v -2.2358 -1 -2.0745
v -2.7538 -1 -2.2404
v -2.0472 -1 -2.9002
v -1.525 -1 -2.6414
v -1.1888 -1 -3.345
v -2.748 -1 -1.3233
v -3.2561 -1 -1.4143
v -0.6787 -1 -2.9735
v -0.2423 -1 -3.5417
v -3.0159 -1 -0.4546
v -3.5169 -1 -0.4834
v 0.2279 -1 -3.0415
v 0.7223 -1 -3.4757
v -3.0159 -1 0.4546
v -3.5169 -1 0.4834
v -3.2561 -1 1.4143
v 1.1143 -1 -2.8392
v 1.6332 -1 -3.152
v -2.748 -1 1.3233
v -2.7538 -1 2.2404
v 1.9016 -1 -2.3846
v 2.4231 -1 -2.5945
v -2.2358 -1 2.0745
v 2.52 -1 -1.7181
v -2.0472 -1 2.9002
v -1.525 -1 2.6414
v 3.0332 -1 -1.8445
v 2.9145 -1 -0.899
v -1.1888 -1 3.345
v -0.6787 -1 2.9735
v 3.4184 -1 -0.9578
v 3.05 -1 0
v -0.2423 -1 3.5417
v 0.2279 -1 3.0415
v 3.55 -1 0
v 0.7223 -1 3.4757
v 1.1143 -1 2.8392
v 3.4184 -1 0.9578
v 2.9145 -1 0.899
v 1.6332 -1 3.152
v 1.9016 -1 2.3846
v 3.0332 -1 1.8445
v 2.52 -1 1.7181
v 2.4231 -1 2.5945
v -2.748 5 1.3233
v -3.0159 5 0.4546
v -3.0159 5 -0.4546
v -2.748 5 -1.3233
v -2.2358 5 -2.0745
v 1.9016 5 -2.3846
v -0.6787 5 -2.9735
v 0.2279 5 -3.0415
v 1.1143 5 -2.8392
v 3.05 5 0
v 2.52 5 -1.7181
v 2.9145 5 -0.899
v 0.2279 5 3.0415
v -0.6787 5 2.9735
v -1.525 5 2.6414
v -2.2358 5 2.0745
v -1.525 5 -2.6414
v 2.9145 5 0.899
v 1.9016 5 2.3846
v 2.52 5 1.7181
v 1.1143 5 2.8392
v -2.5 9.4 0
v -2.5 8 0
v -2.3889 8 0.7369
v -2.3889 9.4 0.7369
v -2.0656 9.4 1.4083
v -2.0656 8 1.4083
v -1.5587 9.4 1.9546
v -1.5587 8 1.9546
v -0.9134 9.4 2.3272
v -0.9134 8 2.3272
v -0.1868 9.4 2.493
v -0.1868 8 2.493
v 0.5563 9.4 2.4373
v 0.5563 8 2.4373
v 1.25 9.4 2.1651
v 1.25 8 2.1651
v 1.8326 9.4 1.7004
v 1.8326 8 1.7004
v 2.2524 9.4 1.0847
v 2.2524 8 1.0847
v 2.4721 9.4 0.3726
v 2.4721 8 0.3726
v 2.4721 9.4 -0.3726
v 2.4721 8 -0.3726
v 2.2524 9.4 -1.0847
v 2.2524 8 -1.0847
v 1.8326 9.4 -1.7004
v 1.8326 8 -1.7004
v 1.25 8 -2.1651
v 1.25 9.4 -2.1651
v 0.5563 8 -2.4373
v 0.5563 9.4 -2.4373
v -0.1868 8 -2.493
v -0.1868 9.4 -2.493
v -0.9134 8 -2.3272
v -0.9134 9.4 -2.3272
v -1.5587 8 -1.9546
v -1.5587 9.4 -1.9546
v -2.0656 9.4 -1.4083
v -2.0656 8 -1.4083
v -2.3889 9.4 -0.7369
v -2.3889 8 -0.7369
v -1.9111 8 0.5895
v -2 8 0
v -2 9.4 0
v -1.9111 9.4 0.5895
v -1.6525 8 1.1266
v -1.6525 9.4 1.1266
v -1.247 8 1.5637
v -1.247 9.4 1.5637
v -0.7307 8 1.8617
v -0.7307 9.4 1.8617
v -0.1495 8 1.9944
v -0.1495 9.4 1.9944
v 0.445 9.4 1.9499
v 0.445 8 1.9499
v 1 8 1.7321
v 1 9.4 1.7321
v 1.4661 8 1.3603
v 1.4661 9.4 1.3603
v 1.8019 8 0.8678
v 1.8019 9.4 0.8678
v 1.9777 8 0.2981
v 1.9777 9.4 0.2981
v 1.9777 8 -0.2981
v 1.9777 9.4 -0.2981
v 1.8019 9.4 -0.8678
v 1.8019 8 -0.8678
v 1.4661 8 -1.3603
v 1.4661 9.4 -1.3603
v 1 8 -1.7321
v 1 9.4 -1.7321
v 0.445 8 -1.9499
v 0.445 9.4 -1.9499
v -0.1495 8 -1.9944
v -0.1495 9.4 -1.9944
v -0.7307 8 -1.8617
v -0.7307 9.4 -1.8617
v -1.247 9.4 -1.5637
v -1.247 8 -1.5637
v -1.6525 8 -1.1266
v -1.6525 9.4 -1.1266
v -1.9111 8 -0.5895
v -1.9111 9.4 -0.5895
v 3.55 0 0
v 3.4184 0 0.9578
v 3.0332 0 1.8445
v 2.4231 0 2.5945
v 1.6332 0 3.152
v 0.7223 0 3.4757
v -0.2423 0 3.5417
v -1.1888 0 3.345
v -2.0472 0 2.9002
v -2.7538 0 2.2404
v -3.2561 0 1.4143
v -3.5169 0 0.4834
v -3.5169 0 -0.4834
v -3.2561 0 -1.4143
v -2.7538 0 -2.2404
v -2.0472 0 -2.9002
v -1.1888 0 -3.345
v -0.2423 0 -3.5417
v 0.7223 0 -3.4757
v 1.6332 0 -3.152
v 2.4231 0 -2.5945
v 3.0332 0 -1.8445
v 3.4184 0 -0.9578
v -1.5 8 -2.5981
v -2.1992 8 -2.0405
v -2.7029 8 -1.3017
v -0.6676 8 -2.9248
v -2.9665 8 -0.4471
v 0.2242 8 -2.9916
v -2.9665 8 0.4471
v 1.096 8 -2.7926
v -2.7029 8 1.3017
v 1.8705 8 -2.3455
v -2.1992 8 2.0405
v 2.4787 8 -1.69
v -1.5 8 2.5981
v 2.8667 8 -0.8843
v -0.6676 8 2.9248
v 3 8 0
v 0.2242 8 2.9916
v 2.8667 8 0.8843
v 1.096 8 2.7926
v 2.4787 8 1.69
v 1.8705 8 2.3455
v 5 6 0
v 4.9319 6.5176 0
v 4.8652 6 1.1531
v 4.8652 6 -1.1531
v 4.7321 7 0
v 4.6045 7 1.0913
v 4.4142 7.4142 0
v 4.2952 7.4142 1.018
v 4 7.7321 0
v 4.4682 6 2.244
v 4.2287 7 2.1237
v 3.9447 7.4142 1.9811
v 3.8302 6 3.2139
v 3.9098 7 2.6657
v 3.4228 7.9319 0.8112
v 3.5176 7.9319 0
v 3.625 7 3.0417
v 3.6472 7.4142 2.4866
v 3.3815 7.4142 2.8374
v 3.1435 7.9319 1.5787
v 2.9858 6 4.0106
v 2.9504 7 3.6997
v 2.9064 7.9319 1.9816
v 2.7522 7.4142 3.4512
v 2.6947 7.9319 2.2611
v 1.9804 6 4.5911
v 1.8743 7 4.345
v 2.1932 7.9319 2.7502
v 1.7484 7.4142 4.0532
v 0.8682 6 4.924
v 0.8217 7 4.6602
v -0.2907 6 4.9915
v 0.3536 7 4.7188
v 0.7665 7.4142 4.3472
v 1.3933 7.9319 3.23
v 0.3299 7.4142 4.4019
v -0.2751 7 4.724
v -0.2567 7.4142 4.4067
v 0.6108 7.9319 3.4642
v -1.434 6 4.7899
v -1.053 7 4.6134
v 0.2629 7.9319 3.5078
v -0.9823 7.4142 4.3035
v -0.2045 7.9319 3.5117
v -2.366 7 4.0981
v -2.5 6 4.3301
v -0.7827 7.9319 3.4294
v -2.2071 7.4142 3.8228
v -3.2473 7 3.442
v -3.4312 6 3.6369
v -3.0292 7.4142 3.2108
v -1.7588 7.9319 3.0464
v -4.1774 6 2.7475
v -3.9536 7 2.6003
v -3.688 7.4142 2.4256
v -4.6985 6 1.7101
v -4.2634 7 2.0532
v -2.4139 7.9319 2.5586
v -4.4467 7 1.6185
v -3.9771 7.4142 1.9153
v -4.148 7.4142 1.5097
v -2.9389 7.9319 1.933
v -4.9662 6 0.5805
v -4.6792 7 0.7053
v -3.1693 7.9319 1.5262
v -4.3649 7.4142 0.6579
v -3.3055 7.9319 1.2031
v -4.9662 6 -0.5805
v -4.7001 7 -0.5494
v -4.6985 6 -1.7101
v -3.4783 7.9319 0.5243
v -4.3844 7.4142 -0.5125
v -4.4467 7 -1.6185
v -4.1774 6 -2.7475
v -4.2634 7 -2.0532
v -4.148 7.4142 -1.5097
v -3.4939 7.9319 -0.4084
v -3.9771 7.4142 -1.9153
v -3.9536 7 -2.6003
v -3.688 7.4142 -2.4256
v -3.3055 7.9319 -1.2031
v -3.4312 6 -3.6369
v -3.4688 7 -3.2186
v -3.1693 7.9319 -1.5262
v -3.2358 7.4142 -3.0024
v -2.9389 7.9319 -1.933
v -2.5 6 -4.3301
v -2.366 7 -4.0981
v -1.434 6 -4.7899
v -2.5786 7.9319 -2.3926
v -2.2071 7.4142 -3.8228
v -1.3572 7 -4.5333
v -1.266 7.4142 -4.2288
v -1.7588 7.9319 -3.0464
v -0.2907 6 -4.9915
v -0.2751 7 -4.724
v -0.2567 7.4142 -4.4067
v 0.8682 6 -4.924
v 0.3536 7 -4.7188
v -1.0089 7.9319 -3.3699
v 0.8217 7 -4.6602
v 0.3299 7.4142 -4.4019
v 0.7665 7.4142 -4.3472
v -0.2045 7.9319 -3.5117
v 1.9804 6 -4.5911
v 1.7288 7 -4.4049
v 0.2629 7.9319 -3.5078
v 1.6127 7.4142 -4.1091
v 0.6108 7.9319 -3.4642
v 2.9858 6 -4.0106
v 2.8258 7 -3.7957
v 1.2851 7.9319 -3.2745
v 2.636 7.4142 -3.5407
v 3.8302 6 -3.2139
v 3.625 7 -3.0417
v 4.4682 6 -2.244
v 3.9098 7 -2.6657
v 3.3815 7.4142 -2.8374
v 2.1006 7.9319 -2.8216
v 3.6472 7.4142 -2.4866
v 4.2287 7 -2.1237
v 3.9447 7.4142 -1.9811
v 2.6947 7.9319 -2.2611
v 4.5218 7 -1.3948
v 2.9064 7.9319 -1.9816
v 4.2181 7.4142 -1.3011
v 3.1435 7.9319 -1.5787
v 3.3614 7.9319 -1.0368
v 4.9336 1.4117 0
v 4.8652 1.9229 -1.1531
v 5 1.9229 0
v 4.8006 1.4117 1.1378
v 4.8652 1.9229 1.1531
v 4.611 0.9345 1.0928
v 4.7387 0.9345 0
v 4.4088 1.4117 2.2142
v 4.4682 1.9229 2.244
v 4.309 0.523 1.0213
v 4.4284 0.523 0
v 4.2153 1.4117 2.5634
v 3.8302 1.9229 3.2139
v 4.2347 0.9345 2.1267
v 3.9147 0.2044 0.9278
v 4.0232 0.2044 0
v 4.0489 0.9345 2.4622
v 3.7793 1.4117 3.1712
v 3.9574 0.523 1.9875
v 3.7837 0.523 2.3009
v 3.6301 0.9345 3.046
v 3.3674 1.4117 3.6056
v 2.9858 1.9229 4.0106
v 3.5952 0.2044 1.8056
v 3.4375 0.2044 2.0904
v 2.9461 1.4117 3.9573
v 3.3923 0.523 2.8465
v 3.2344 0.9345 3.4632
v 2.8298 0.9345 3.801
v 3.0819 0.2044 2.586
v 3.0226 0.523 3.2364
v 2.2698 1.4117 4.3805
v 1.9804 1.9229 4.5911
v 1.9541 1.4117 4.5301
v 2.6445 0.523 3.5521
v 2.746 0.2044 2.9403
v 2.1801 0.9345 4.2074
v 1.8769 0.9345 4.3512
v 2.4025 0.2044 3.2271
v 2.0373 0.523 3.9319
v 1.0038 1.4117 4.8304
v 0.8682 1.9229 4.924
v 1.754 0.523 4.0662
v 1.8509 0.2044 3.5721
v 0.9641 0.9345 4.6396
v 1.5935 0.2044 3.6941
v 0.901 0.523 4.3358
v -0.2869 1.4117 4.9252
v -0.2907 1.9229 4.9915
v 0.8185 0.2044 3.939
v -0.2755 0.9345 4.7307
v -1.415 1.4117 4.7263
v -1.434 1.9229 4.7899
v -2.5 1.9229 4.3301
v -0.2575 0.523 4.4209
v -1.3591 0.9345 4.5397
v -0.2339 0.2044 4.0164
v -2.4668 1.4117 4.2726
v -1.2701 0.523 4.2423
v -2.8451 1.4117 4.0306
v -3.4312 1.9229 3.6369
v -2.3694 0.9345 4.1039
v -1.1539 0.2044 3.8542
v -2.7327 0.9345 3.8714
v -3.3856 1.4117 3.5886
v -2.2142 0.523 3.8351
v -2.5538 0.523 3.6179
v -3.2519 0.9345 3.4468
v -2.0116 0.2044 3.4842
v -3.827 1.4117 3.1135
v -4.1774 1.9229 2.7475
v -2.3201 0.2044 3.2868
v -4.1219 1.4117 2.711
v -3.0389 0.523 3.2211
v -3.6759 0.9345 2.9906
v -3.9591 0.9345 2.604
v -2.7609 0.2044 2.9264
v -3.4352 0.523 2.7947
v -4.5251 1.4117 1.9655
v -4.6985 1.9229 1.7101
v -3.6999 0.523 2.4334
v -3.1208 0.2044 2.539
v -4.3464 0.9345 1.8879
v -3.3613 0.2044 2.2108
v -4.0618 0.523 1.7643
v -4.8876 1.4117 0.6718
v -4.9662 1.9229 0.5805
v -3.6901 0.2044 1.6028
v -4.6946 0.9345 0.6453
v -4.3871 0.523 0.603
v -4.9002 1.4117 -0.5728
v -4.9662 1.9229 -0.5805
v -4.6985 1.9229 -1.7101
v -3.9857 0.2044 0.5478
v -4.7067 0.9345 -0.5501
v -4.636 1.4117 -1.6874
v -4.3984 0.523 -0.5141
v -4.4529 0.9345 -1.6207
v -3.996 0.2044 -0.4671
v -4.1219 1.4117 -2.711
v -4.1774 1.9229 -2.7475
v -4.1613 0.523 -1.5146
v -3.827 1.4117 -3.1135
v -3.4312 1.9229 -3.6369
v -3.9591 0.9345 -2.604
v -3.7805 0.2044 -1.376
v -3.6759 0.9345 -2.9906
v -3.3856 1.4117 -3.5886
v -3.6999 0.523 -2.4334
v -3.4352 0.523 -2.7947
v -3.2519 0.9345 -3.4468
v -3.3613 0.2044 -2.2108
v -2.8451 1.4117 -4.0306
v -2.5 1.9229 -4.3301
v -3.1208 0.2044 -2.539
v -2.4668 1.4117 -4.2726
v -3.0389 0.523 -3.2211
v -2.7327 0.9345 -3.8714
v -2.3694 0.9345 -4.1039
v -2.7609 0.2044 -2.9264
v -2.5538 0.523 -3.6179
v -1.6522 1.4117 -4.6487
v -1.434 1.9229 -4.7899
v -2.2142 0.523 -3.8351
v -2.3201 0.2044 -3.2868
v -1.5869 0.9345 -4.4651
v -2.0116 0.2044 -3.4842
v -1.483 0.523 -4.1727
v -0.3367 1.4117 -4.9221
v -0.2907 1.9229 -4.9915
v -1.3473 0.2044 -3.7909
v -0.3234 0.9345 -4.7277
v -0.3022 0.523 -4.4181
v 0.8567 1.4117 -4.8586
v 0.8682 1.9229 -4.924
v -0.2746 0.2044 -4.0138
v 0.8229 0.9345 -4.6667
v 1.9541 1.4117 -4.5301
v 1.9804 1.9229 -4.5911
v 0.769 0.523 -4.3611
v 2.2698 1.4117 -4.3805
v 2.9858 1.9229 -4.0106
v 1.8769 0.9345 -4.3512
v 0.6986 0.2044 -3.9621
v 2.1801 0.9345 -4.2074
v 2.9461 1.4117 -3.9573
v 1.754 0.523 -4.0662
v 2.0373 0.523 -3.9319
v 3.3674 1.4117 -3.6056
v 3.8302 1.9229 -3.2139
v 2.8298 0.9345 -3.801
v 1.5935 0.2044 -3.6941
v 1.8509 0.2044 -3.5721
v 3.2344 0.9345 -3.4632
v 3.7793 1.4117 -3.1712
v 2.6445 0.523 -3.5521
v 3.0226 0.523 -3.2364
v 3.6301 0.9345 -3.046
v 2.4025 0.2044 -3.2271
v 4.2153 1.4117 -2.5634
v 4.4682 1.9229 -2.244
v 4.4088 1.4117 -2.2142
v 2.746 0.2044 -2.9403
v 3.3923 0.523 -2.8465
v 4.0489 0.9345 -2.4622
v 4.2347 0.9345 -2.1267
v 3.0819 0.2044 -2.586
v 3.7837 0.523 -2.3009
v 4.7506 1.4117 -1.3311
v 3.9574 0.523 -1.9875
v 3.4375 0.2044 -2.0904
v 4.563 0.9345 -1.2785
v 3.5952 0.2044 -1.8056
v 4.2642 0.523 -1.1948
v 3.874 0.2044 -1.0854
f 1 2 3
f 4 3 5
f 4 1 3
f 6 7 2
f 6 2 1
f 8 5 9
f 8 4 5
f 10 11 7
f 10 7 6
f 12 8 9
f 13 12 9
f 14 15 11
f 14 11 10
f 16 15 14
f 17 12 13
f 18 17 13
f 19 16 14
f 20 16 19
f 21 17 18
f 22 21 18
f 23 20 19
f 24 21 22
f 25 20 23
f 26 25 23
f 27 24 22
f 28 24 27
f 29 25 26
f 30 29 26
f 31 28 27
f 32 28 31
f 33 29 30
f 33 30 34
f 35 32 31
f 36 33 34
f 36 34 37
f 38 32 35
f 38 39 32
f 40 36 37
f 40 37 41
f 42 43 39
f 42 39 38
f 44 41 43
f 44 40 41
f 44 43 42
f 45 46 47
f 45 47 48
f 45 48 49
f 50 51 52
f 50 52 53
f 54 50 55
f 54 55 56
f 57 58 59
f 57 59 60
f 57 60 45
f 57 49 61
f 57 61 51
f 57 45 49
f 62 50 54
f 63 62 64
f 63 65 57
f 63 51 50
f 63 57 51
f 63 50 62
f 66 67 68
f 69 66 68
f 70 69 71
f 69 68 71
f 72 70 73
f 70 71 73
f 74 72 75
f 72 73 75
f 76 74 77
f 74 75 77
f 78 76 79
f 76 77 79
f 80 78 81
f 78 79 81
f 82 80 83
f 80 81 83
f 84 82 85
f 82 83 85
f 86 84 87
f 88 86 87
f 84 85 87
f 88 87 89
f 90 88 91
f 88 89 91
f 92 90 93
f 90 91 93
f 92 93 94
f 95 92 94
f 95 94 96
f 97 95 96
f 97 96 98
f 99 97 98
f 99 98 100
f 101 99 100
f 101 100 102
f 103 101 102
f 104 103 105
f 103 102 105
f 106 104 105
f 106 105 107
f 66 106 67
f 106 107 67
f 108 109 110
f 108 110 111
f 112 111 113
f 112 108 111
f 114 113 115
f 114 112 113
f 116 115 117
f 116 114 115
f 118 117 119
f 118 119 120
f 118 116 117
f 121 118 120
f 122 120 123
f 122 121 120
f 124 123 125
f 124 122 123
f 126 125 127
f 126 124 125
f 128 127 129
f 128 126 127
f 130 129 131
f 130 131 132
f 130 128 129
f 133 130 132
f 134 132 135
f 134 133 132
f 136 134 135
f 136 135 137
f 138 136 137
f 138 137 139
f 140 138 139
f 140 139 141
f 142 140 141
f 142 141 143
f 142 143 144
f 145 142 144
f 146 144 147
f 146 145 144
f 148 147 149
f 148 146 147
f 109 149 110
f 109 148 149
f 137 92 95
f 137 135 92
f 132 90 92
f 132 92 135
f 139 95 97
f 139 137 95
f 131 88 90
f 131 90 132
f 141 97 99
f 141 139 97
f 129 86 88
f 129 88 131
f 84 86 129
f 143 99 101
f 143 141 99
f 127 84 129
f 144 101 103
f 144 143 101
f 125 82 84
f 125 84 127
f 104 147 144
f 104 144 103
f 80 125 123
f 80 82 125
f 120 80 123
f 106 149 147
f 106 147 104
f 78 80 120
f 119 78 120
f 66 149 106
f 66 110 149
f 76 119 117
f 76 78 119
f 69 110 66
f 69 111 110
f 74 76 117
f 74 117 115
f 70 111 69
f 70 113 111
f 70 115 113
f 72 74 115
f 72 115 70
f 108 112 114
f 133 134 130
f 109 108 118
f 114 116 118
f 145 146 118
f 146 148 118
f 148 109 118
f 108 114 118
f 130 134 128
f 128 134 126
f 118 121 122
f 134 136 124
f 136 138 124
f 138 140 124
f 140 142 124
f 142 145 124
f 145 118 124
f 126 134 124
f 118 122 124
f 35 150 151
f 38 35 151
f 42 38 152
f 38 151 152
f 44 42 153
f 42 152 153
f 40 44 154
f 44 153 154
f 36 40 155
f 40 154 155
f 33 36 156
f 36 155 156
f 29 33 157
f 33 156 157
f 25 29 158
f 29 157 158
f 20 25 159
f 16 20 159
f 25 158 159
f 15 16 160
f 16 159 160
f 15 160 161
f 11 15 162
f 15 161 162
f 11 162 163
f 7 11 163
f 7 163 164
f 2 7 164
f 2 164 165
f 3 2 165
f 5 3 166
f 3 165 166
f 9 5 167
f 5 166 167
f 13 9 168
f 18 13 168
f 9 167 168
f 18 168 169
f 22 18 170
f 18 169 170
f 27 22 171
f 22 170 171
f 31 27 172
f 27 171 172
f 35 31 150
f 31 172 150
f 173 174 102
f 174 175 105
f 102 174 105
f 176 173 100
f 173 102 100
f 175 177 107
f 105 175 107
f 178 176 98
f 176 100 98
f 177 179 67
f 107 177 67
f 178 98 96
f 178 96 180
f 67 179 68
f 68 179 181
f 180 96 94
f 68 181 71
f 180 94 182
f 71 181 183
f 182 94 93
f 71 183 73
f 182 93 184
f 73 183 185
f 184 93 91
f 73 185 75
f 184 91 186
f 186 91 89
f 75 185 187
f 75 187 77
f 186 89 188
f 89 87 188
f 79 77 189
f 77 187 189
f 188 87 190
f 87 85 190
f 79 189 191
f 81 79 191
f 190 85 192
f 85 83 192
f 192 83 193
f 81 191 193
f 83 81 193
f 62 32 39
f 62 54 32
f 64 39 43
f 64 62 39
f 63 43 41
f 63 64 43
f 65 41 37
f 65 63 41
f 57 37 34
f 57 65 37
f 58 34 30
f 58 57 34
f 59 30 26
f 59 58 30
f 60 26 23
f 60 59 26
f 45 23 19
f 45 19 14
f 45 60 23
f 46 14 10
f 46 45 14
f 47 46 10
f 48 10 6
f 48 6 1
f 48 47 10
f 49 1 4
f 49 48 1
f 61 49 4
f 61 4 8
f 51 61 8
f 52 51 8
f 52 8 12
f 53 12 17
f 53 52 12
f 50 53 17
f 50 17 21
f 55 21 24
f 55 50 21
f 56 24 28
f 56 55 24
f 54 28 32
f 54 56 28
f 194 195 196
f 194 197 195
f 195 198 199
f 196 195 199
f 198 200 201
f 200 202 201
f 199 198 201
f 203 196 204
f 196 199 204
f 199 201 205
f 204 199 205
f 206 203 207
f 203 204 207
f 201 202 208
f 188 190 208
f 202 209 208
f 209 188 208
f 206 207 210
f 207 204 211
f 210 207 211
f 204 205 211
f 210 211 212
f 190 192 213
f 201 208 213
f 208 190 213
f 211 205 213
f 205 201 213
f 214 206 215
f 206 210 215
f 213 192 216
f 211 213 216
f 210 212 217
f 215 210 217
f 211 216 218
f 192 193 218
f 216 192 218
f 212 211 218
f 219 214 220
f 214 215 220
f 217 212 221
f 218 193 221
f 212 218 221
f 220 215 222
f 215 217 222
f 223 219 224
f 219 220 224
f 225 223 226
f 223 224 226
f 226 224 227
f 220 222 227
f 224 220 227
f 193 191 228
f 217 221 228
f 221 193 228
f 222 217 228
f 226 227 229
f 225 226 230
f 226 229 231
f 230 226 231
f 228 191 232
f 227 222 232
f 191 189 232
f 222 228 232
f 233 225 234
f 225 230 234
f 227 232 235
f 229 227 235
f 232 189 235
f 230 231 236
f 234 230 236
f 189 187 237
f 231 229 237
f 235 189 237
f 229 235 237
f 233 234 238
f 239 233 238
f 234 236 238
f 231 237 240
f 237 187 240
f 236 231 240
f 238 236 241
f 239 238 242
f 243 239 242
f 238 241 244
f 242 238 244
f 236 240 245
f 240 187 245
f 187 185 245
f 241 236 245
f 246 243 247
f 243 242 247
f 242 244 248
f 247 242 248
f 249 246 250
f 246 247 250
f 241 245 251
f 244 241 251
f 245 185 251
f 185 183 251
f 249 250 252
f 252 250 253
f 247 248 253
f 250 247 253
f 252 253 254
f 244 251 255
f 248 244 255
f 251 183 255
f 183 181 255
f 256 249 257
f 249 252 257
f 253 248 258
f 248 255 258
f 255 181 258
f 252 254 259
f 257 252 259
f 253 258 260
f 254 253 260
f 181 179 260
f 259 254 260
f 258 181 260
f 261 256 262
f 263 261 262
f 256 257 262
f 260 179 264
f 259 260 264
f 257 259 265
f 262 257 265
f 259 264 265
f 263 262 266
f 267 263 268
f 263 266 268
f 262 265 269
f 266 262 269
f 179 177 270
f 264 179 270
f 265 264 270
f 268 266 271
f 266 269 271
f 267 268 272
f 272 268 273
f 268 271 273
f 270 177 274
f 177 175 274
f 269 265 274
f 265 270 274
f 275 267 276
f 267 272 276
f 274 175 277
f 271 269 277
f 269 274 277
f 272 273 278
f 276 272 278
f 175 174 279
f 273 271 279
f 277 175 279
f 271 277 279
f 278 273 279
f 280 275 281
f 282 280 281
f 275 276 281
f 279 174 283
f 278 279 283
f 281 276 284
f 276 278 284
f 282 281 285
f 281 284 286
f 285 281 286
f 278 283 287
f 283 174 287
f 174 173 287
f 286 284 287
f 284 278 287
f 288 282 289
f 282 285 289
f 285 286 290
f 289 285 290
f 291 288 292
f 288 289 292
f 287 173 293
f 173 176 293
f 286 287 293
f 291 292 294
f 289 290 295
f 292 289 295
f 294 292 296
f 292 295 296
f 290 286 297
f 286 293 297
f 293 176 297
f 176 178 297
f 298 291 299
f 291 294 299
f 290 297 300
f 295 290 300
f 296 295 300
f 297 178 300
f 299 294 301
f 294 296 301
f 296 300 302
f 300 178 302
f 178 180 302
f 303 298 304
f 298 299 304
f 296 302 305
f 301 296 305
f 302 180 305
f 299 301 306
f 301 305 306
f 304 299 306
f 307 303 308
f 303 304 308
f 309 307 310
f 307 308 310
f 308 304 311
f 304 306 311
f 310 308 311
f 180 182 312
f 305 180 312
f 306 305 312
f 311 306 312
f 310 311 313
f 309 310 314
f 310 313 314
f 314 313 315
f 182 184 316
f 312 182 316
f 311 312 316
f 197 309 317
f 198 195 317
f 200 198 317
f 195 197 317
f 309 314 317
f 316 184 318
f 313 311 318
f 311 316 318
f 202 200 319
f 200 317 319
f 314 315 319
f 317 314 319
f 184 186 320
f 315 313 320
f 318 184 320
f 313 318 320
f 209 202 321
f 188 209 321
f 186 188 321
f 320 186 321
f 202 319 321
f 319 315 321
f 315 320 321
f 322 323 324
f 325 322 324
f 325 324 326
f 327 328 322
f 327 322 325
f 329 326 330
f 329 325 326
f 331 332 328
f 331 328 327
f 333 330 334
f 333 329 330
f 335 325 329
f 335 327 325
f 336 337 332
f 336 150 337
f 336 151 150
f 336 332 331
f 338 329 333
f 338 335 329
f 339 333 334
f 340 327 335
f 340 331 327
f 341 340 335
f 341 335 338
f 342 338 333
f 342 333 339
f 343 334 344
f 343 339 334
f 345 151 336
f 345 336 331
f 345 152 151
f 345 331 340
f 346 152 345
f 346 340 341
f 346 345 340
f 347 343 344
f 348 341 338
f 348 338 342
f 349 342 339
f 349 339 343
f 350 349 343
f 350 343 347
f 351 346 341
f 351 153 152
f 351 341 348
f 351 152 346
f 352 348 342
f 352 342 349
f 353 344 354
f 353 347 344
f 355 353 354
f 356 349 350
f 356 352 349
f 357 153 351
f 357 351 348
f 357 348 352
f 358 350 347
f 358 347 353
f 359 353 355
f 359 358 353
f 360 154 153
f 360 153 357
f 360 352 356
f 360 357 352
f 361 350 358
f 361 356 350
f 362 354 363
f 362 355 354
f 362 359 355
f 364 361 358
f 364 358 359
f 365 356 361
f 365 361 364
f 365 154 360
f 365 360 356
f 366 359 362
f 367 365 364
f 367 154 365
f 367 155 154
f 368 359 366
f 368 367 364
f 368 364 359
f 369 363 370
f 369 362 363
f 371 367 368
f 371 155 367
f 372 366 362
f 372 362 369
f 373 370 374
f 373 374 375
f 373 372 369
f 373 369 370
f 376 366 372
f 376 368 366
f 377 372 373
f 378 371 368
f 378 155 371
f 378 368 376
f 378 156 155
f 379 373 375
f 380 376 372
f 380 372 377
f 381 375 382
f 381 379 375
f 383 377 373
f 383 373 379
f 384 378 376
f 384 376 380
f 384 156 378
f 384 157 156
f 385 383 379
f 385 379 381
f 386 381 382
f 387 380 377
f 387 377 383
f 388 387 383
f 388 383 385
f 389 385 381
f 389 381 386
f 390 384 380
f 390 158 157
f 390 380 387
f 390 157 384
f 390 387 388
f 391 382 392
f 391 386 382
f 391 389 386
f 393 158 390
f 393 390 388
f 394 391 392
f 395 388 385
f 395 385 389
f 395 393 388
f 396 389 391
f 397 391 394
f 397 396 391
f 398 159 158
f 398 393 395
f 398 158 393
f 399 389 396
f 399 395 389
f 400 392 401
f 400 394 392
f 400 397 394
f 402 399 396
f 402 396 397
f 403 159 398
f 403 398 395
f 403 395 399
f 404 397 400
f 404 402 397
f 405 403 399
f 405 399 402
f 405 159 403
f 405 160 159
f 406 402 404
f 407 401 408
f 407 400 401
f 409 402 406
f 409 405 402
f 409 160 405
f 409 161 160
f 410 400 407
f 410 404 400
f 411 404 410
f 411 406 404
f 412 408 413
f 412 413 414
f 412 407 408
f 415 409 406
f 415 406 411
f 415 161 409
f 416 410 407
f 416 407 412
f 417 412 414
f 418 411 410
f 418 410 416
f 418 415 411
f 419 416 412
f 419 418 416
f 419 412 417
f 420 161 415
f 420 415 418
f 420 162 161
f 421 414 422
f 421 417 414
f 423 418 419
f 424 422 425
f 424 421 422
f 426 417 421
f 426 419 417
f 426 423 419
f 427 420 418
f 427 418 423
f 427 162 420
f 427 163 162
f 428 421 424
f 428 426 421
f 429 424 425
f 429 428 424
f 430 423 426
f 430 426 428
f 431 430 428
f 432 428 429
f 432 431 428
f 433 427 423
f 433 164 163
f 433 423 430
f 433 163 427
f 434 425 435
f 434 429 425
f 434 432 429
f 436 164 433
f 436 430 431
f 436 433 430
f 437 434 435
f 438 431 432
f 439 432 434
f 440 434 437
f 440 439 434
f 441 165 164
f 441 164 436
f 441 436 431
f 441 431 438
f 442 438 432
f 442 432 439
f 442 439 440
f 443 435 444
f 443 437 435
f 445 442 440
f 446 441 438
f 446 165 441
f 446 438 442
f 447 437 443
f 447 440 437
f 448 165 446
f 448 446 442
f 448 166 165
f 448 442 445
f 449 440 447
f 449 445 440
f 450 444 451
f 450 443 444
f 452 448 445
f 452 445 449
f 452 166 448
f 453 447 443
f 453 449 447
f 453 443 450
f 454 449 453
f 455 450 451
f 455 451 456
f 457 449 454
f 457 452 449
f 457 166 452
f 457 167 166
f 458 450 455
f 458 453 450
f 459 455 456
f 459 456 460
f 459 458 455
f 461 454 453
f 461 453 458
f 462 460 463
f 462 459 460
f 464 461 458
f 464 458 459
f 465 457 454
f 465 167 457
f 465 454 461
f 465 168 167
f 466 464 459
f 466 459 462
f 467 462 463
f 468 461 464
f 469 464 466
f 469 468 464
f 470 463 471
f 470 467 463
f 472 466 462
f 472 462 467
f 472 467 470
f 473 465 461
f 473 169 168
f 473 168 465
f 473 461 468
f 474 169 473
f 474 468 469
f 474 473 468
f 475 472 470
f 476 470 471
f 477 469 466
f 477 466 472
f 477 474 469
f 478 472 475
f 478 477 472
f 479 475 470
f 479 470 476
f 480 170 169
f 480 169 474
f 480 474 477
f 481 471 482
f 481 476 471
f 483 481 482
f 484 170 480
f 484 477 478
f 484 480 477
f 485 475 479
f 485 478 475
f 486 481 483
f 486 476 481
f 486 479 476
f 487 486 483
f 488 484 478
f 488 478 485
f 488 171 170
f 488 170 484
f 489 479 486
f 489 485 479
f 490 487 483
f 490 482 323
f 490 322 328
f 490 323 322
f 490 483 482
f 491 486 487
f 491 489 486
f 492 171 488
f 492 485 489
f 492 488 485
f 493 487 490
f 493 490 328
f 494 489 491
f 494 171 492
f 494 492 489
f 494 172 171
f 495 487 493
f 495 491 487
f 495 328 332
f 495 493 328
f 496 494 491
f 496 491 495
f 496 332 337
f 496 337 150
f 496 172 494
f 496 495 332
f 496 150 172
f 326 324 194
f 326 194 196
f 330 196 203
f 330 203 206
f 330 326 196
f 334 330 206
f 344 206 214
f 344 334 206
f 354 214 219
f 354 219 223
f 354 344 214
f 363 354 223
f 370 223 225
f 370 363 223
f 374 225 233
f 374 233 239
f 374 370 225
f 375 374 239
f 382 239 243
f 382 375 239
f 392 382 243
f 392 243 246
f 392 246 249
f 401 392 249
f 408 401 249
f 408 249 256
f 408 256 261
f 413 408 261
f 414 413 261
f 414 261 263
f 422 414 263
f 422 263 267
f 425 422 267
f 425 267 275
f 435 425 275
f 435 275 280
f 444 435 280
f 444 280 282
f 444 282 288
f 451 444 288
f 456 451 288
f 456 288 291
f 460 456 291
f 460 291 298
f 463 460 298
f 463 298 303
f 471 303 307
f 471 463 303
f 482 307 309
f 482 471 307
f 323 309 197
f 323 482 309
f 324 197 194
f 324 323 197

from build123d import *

# Parameters (mm, degrees)
F0_R     = 3.55
F0_R_2   = 3.05
F1_DEPTH = 1
F2_R     = 5
F3_DEPTH = 8
F5_R     = 2.5
F5_R_2   = 2
F6_DEPTH = 1.4
F8_DEPTH = 5


# Not quite as in the source:
# - a fillet or chamfer that OpenCascade refuses, or shapes differently, is made with other operations: its cross-section is extruded or revolved along the edge and cut away or added


with BuildPart() as f1:
    # F0 (on Front) → F1 (new body)
    with BuildSketch(Plane.XZ):
        Circle(F0_R)
        Circle(F0_R_2, mode=Mode.SUBTRACT)
    extrude(amount=F1_DEPTH)

    # F2 (on Front) → F3 (join)
    with BuildSketch(Plane.XZ):
        Circle(F2_R)
    extrude(amount=-F3_DEPTH)

    # F5 (on face) → F6 (join)
    with BuildSketch(Plane(origin=(0, 8, 0), x_dir=(-1, 0, 0), z_dir=(0, 1, 0))):
        Circle(F5_R)
        Circle(F5_R_2, mode=Mode.SUBTRACT)
    extrude(amount=F6_DEPTH)

    # F7: fillet of radius 2 on 2 edges, made by hand

    # F7_s1 → F7_t2 (revolve, cut)
    with BuildSketch(Plane.XY):
        with BuildLine():
            ThreePointArc((5, 6), (4.4142135624, 7.4142135624), (3, 8))
            Line((3, 8), (5, 8))
            Line((5, 8), (5, 6))
        make_face()
    revolve(axis=Axis((0, 8, 0), (0, -1, 0)), mode=Mode.SUBTRACT)

    # F7_s3 → F7_t4 (revolve, cut)
    with BuildSketch(Plane.XY):
        with BuildLine():
            ThreePointArc((5, 1.9228884523), (4.5968719423, 0.7187289944), (3.55, 0))
            Line((3.55, 0), (5, 0))
            Line((5, 0), (5, 1.9228884523))
        make_face()
    revolve(axis=Axis((0, 0, 0), (0, -1, 0)), mode=Mode.SUBTRACT)

    # F8 (cut): a face of the model
    f8_faces = [f1.faces().sort_by_distance(p)[0] for p in [
        (0, 0, 0),
    ]]
    extrude(f8_faces, amount=-F8_DEPTH, mode=Mode.SUBTRACT)


solid = f1.part
